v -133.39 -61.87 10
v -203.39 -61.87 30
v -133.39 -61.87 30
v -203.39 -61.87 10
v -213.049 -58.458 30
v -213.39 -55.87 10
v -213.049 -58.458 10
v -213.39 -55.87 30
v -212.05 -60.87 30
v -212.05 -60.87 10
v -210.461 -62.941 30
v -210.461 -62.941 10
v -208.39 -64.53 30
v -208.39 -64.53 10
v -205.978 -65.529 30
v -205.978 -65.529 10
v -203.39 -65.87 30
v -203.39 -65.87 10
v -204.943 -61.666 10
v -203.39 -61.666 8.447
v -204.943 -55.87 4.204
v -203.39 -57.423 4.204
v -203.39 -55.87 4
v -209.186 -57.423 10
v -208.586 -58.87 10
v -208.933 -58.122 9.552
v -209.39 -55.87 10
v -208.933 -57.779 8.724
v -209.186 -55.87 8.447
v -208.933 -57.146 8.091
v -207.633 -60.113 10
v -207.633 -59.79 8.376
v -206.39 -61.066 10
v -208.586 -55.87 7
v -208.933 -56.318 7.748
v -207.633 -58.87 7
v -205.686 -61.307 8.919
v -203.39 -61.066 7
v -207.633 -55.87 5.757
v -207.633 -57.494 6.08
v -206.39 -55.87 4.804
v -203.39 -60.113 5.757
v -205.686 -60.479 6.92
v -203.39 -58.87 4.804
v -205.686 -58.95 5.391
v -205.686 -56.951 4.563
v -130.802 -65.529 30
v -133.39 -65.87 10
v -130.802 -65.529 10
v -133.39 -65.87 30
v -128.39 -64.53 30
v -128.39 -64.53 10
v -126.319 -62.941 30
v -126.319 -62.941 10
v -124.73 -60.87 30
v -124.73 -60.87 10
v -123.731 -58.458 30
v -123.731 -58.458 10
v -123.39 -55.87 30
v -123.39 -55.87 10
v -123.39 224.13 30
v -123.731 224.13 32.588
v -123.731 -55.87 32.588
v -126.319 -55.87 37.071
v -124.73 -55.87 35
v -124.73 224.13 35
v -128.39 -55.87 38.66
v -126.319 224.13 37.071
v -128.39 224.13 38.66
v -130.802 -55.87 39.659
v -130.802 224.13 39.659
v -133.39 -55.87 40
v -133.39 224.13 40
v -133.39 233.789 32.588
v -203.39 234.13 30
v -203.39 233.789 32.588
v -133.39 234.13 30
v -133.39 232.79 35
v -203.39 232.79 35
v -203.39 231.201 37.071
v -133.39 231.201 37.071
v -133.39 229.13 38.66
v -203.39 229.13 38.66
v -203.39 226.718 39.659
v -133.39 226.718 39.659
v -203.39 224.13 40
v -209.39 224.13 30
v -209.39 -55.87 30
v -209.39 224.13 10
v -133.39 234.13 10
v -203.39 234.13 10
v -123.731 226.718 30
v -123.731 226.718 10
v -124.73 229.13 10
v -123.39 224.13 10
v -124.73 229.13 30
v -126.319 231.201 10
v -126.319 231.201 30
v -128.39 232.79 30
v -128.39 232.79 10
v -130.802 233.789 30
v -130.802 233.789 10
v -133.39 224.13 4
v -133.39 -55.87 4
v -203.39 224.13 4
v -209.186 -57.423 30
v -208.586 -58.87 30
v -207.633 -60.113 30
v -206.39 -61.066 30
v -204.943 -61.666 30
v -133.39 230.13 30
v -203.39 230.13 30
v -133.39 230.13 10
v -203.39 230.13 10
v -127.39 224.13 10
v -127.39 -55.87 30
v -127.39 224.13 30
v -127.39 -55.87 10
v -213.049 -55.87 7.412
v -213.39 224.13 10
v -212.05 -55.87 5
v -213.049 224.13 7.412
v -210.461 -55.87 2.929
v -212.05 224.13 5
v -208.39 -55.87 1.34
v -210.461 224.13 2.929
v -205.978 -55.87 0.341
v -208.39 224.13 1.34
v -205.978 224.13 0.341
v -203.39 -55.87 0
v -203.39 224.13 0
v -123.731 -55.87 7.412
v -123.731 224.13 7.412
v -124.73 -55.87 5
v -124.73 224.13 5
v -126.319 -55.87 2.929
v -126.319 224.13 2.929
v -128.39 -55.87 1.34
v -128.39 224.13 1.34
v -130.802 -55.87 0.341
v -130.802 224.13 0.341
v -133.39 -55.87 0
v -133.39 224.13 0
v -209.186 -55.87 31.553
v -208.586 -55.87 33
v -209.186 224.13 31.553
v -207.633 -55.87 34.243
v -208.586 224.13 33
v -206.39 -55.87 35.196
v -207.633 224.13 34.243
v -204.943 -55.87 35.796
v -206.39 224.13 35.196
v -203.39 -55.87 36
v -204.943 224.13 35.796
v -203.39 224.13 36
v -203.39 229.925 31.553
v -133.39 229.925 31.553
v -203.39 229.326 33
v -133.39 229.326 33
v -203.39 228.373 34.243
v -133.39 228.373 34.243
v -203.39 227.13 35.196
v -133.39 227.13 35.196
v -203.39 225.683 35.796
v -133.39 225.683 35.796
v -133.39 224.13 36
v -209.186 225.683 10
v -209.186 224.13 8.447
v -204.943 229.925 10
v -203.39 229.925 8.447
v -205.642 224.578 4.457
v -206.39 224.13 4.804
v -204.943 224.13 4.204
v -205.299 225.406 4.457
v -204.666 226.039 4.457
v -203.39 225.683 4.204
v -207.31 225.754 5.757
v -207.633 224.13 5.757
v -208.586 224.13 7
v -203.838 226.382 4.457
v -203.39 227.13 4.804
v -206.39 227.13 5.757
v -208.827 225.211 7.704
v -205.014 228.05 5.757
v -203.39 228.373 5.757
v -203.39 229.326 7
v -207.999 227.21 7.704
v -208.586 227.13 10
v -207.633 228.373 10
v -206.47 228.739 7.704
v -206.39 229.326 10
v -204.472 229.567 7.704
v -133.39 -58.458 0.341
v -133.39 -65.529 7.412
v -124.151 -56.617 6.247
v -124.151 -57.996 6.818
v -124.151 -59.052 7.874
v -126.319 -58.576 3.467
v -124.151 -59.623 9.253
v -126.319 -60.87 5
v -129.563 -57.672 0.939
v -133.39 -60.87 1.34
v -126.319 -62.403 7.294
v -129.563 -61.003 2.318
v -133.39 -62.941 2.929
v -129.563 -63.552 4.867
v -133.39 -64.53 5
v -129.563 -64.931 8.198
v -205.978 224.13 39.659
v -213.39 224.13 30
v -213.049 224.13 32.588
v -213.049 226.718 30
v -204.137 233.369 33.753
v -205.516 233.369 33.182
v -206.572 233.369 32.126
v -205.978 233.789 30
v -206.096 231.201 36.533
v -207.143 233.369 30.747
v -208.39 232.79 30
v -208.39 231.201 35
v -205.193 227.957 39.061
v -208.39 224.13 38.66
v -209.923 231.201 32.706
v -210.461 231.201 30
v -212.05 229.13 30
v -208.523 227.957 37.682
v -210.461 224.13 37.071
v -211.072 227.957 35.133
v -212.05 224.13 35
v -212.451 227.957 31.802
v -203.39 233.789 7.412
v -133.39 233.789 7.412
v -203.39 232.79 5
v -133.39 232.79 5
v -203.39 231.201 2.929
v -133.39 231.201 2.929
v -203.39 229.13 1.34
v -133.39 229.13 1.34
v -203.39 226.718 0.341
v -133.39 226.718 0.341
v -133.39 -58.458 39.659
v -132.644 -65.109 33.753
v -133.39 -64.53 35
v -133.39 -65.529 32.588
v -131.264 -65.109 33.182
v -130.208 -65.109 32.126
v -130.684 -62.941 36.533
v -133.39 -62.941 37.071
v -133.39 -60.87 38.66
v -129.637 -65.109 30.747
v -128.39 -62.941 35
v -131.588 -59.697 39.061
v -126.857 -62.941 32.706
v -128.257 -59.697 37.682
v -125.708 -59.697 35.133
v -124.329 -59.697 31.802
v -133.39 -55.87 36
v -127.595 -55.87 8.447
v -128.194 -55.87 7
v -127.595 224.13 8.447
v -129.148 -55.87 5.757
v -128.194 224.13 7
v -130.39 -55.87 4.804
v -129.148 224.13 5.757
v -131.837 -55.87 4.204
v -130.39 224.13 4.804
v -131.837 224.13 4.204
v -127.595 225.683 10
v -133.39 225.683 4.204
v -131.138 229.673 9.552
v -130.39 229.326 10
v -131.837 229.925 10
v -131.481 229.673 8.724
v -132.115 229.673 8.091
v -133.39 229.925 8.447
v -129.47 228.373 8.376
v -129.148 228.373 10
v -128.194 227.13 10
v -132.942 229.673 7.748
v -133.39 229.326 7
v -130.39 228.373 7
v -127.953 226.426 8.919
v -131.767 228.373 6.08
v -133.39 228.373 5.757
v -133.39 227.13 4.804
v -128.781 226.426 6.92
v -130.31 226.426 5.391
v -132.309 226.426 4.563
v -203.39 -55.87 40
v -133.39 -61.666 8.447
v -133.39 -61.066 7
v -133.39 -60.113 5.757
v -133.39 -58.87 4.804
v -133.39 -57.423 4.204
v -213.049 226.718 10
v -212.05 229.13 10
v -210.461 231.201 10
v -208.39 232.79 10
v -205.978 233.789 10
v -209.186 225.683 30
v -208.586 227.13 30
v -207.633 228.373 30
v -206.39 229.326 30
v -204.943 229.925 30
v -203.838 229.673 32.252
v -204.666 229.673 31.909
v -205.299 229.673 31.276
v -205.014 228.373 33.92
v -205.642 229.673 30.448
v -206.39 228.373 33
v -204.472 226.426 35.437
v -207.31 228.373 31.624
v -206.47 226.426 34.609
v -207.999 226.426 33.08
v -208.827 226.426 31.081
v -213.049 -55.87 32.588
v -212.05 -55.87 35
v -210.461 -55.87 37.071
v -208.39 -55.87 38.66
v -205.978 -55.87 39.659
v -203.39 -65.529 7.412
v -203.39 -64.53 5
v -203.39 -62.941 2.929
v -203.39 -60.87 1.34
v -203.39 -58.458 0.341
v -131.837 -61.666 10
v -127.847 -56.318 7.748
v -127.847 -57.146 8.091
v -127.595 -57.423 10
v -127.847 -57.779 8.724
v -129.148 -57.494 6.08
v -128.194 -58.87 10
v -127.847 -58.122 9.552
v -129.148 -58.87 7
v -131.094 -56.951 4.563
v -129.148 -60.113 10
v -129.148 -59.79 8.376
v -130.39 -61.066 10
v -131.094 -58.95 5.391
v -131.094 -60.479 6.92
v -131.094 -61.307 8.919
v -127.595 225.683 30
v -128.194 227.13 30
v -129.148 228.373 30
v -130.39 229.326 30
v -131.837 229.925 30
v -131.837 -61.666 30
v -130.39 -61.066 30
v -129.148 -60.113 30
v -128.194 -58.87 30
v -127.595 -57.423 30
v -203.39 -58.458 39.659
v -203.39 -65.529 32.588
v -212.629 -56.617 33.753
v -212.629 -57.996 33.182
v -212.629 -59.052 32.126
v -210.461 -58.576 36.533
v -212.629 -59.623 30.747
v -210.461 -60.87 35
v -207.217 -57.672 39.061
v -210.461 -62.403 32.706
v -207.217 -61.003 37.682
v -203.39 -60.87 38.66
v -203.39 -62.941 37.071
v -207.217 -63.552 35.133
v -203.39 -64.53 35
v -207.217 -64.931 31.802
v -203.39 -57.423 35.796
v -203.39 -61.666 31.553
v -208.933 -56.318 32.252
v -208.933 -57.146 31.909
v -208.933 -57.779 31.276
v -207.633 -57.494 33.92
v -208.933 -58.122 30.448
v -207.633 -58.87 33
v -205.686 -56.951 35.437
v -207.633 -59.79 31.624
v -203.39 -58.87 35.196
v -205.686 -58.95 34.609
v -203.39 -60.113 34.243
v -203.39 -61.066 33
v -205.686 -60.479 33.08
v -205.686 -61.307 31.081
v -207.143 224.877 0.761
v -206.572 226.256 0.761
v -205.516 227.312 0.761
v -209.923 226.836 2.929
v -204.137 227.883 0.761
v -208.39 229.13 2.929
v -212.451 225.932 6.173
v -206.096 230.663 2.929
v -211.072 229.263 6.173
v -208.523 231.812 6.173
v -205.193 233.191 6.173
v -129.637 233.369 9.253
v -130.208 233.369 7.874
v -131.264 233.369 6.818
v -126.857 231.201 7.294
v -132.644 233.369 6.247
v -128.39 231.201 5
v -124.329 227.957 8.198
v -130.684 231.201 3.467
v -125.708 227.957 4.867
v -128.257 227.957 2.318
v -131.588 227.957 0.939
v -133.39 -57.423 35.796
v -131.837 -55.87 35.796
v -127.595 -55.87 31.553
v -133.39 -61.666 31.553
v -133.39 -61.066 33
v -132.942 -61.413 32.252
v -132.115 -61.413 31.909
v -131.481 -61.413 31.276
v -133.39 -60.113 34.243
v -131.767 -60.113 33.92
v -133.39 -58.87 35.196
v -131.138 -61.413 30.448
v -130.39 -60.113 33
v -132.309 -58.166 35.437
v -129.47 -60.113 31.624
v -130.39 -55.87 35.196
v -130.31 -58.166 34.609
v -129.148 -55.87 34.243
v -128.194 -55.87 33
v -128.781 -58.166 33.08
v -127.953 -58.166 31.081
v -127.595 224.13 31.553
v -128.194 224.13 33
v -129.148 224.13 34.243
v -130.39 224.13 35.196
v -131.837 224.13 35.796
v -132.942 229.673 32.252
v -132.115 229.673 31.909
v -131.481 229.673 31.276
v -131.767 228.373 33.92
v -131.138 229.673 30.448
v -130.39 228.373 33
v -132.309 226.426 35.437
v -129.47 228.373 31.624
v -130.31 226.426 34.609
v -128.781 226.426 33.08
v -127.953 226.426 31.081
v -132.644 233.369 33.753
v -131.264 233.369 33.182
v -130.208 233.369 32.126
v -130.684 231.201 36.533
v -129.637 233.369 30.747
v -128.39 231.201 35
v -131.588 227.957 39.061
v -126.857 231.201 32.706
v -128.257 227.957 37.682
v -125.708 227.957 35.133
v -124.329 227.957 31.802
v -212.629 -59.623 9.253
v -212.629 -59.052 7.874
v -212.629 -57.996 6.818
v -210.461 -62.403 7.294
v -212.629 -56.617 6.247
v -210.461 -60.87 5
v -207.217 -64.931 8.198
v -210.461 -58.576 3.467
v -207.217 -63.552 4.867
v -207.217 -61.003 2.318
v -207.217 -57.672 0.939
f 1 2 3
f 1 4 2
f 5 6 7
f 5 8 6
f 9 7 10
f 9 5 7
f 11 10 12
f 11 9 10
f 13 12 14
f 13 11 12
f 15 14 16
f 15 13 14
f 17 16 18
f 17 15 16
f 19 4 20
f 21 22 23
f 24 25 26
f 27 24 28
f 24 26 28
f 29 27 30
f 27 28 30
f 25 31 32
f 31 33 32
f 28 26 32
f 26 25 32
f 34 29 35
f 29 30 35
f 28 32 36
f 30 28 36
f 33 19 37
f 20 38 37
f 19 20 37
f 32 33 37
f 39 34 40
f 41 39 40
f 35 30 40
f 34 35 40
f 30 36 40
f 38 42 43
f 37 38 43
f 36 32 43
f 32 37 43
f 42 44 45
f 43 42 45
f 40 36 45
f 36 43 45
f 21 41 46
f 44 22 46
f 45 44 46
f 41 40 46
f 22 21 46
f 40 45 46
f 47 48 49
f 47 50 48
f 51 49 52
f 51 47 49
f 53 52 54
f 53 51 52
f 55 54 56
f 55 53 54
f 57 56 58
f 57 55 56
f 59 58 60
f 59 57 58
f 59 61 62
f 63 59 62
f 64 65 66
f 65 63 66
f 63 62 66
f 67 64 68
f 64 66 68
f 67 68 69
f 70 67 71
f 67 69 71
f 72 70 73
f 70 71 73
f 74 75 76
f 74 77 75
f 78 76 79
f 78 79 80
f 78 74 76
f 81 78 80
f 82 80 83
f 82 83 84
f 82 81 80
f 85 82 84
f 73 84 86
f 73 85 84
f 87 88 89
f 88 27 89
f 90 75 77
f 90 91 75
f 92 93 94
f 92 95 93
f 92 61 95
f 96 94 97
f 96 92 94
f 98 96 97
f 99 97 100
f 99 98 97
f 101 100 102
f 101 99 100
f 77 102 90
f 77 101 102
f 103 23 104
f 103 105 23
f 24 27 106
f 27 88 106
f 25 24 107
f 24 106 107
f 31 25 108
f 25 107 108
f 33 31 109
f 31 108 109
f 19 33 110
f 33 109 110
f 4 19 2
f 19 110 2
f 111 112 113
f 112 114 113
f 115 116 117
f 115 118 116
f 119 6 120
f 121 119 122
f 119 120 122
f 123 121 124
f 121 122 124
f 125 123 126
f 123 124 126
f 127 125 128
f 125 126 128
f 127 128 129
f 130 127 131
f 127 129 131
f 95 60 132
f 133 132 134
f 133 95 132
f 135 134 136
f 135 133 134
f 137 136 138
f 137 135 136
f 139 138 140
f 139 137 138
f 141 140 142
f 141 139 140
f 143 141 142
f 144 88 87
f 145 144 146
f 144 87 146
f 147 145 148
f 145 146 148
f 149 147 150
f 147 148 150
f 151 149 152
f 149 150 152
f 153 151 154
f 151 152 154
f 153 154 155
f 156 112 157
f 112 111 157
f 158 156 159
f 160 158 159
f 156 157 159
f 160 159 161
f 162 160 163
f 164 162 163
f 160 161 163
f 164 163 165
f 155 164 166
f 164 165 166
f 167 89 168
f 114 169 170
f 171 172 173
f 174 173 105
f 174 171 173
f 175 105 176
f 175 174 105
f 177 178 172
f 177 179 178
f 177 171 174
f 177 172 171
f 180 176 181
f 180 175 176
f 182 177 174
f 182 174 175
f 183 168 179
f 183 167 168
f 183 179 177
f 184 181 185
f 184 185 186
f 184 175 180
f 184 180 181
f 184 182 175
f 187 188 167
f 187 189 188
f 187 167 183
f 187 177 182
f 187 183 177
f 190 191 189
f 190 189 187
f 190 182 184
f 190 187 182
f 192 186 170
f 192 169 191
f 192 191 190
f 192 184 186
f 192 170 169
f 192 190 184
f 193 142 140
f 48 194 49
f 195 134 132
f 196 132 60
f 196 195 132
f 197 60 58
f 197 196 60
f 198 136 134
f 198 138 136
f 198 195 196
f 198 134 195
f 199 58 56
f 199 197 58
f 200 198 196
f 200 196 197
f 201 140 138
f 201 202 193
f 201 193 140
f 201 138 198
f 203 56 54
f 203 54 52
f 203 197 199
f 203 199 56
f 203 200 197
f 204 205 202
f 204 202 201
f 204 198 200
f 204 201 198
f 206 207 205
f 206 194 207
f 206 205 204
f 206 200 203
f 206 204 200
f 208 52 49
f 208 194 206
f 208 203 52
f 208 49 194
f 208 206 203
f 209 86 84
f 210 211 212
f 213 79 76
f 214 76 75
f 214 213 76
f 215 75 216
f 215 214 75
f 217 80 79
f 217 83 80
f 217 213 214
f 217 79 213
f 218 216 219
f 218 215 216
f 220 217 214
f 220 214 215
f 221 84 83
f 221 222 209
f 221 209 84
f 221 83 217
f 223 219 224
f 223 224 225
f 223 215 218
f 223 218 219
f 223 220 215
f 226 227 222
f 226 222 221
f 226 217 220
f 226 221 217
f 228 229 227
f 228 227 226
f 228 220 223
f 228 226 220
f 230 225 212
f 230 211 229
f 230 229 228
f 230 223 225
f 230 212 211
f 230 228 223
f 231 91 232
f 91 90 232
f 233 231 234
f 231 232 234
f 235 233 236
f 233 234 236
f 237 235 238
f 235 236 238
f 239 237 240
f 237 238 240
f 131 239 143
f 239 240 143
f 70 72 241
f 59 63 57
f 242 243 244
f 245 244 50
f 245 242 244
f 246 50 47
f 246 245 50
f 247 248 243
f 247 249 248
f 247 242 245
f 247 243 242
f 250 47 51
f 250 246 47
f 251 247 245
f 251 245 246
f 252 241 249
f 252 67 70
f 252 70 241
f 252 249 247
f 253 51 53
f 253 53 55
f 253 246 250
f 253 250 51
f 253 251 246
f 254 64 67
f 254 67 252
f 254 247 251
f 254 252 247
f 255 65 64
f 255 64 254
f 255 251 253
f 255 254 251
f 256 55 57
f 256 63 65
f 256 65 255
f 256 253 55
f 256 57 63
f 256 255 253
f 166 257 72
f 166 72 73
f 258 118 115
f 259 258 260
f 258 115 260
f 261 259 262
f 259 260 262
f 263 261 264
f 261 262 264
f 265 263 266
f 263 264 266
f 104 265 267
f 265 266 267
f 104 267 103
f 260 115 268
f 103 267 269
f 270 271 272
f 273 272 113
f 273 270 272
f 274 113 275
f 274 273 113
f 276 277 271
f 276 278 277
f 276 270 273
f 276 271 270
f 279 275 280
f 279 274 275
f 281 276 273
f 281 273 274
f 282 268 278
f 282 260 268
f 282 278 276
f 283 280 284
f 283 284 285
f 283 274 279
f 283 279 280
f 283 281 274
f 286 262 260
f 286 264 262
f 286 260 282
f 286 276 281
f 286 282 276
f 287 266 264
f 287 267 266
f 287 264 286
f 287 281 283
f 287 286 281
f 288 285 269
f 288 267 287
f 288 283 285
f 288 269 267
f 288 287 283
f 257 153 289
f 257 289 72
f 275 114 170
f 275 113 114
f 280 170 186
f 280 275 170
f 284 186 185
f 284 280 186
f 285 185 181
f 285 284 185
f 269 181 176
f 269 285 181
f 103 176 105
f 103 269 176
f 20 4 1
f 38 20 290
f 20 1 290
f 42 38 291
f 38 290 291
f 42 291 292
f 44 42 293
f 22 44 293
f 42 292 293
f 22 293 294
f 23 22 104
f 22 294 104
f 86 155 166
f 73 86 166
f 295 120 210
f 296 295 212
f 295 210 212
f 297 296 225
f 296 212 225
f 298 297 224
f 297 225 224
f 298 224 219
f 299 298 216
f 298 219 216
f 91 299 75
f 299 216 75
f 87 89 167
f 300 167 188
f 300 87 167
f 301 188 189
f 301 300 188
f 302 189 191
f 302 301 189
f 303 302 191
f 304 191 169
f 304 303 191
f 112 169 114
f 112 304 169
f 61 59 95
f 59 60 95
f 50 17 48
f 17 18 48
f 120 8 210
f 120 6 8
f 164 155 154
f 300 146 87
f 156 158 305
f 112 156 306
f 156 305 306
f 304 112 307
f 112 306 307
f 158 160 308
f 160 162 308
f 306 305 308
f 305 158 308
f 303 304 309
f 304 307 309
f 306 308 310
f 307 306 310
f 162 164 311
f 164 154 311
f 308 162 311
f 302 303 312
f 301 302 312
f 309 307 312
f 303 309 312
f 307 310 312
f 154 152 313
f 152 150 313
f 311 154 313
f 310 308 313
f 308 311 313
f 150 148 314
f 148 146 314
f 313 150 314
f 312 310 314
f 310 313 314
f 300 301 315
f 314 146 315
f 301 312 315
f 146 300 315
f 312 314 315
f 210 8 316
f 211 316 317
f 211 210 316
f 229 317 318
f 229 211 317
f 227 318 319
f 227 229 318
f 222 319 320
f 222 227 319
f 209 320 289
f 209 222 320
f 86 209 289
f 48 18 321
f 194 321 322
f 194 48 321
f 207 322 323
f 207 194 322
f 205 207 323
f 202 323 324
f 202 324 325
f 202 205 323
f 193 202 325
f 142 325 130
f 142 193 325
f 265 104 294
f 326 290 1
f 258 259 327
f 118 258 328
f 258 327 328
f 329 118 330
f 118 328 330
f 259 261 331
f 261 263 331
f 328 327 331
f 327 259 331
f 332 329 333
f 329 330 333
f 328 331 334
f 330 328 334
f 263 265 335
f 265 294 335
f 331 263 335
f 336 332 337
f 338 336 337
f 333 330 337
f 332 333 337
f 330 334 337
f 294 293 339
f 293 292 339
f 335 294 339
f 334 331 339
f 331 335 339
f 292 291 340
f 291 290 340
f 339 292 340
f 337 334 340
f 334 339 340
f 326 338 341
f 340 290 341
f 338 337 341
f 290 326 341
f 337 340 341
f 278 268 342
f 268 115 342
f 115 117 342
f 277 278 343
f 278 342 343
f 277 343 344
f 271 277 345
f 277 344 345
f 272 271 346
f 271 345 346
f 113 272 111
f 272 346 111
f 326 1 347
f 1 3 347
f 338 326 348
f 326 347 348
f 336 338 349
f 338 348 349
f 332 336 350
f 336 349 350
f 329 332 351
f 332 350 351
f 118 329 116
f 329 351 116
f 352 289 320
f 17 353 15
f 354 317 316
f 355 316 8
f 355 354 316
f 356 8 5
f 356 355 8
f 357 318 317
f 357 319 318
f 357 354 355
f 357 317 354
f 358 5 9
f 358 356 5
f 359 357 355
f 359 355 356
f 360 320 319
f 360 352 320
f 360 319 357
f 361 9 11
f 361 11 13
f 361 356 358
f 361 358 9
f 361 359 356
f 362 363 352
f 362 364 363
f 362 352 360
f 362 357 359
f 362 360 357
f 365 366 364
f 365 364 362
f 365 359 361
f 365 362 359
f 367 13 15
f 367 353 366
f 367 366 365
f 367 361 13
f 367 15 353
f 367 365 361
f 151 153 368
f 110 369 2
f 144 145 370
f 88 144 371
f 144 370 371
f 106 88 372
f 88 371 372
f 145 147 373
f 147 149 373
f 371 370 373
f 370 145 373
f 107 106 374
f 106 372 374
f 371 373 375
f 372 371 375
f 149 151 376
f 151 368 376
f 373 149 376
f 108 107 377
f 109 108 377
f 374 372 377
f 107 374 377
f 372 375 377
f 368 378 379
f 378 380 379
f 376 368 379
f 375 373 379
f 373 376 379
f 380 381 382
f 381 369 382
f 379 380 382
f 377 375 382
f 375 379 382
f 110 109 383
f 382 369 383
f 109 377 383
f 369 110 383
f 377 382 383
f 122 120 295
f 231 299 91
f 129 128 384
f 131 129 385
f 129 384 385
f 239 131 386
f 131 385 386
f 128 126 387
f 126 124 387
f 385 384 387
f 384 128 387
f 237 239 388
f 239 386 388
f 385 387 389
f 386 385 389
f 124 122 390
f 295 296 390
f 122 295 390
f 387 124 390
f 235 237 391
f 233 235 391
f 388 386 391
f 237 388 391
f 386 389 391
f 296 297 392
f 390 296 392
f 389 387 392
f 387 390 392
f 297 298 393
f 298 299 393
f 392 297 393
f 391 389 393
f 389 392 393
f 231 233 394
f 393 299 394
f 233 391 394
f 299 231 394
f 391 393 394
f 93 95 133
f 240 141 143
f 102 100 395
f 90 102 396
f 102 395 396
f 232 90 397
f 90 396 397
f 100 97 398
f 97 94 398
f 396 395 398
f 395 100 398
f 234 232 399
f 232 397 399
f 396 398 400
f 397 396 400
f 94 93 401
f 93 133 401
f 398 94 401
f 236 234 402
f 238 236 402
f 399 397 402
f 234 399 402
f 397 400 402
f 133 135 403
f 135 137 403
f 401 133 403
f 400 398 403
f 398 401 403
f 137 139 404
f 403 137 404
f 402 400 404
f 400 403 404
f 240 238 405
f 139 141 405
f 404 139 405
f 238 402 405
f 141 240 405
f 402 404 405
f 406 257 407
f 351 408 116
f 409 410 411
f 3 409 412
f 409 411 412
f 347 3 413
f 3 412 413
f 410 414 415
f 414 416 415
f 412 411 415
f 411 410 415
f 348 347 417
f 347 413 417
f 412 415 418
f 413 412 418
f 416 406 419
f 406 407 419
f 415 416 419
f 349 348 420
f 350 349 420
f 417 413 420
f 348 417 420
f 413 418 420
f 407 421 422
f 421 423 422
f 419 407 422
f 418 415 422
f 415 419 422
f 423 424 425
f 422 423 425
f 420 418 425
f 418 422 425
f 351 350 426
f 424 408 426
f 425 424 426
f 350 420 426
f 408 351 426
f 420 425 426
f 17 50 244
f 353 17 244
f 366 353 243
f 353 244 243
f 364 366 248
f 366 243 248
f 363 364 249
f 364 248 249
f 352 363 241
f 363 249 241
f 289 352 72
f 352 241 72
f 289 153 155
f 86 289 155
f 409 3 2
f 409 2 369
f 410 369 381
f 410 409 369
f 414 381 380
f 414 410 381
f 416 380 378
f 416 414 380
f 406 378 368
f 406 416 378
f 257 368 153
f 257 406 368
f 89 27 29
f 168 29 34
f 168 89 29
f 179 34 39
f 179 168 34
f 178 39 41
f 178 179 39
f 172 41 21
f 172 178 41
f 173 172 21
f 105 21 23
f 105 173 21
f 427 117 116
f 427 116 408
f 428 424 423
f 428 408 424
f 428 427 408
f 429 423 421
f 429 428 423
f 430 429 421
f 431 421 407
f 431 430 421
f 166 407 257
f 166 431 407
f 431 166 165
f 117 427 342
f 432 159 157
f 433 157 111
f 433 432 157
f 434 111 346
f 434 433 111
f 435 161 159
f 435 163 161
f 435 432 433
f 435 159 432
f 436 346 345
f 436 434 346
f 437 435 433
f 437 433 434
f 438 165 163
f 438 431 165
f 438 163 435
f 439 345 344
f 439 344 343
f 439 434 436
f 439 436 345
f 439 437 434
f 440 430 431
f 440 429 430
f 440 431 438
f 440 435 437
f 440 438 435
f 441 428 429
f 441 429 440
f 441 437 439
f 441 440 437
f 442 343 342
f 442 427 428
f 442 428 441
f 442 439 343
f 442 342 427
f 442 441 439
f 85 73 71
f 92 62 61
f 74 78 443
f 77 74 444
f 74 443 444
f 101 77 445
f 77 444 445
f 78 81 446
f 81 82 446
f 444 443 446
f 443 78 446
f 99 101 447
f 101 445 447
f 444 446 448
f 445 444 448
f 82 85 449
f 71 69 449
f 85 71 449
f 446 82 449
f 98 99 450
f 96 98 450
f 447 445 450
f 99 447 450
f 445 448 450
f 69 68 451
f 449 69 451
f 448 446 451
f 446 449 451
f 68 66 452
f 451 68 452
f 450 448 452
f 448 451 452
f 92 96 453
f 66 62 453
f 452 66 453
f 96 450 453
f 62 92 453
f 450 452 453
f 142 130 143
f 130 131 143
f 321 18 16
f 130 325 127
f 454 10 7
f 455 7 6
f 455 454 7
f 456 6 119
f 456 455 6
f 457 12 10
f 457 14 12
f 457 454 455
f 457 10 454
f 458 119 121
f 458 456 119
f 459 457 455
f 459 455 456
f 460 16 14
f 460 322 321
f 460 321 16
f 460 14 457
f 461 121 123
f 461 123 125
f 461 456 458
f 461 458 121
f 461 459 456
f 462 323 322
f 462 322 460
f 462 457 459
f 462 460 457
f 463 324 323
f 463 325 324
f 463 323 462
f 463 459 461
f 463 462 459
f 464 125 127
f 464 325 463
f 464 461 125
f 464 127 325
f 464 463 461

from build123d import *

# Parameters (mm, degrees)
F0_W     = 90
F0_H     = 300
F1_DEPTH = 40
F2_R     = 10
F3_T     = -4


# Not quite as in the source:
# - a shell that OpenCascade refuses in one call is made with other operations: the cavity is built on its own and cut out


with BuildPart() as f1:
    # F0 (on Top) → F1 (new body)
    with BuildSketch(Plane.XY):
        with Locations((-168.3901532187, 84.1299444437)):
            Rectangle(F0_W, F0_H)
    extrude(amount=F1_DEPTH)

    # F2
    f2_edges = [f1.edges().sort_by_distance(p)[0] for p in [
        (-123.390153, 84.129944, 40),
        (-168.390153, -65.870056, 40),
        (-213.390153, 84.129944, 40),
        (-168.390153, 234.129944, 40),
        (-168.390153, -65.870056, 0),
        (-123.390153, 84.129944, 0),
        (-123.390153, 234.129944, 20),
        (-123.390153, -65.870056, 20),
        (-213.390153, -65.870056, 20),
        (-213.390153, 234.129944, 20),
        (-213.390153, 84.129944, 0),
        (-168.390153, 234.129944, 0),
    ]]
    fillet(f2_edges, radius=F2_R)

    # F3: a shell. OpenCascade refuses it in one call, so the cavity is built on its own and cut out:
    # the body offset inwards by the wall thickness, plus a prism from it out through each open face.
    f3_core = offset(f1.part, amount=F3_T, mode=Mode.PRIVATE)
    f3_exits = [f3_core.faces().sort_by_distance(p)[0] for p in [
        (-168.390153, 84.129944, 36),
    ]]
    add(f3_core, mode=Mode.SUBTRACT)
    extrude(f3_exits, amount=-F3_T, mode=Mode.SUBTRACT)


solid = f1.part
